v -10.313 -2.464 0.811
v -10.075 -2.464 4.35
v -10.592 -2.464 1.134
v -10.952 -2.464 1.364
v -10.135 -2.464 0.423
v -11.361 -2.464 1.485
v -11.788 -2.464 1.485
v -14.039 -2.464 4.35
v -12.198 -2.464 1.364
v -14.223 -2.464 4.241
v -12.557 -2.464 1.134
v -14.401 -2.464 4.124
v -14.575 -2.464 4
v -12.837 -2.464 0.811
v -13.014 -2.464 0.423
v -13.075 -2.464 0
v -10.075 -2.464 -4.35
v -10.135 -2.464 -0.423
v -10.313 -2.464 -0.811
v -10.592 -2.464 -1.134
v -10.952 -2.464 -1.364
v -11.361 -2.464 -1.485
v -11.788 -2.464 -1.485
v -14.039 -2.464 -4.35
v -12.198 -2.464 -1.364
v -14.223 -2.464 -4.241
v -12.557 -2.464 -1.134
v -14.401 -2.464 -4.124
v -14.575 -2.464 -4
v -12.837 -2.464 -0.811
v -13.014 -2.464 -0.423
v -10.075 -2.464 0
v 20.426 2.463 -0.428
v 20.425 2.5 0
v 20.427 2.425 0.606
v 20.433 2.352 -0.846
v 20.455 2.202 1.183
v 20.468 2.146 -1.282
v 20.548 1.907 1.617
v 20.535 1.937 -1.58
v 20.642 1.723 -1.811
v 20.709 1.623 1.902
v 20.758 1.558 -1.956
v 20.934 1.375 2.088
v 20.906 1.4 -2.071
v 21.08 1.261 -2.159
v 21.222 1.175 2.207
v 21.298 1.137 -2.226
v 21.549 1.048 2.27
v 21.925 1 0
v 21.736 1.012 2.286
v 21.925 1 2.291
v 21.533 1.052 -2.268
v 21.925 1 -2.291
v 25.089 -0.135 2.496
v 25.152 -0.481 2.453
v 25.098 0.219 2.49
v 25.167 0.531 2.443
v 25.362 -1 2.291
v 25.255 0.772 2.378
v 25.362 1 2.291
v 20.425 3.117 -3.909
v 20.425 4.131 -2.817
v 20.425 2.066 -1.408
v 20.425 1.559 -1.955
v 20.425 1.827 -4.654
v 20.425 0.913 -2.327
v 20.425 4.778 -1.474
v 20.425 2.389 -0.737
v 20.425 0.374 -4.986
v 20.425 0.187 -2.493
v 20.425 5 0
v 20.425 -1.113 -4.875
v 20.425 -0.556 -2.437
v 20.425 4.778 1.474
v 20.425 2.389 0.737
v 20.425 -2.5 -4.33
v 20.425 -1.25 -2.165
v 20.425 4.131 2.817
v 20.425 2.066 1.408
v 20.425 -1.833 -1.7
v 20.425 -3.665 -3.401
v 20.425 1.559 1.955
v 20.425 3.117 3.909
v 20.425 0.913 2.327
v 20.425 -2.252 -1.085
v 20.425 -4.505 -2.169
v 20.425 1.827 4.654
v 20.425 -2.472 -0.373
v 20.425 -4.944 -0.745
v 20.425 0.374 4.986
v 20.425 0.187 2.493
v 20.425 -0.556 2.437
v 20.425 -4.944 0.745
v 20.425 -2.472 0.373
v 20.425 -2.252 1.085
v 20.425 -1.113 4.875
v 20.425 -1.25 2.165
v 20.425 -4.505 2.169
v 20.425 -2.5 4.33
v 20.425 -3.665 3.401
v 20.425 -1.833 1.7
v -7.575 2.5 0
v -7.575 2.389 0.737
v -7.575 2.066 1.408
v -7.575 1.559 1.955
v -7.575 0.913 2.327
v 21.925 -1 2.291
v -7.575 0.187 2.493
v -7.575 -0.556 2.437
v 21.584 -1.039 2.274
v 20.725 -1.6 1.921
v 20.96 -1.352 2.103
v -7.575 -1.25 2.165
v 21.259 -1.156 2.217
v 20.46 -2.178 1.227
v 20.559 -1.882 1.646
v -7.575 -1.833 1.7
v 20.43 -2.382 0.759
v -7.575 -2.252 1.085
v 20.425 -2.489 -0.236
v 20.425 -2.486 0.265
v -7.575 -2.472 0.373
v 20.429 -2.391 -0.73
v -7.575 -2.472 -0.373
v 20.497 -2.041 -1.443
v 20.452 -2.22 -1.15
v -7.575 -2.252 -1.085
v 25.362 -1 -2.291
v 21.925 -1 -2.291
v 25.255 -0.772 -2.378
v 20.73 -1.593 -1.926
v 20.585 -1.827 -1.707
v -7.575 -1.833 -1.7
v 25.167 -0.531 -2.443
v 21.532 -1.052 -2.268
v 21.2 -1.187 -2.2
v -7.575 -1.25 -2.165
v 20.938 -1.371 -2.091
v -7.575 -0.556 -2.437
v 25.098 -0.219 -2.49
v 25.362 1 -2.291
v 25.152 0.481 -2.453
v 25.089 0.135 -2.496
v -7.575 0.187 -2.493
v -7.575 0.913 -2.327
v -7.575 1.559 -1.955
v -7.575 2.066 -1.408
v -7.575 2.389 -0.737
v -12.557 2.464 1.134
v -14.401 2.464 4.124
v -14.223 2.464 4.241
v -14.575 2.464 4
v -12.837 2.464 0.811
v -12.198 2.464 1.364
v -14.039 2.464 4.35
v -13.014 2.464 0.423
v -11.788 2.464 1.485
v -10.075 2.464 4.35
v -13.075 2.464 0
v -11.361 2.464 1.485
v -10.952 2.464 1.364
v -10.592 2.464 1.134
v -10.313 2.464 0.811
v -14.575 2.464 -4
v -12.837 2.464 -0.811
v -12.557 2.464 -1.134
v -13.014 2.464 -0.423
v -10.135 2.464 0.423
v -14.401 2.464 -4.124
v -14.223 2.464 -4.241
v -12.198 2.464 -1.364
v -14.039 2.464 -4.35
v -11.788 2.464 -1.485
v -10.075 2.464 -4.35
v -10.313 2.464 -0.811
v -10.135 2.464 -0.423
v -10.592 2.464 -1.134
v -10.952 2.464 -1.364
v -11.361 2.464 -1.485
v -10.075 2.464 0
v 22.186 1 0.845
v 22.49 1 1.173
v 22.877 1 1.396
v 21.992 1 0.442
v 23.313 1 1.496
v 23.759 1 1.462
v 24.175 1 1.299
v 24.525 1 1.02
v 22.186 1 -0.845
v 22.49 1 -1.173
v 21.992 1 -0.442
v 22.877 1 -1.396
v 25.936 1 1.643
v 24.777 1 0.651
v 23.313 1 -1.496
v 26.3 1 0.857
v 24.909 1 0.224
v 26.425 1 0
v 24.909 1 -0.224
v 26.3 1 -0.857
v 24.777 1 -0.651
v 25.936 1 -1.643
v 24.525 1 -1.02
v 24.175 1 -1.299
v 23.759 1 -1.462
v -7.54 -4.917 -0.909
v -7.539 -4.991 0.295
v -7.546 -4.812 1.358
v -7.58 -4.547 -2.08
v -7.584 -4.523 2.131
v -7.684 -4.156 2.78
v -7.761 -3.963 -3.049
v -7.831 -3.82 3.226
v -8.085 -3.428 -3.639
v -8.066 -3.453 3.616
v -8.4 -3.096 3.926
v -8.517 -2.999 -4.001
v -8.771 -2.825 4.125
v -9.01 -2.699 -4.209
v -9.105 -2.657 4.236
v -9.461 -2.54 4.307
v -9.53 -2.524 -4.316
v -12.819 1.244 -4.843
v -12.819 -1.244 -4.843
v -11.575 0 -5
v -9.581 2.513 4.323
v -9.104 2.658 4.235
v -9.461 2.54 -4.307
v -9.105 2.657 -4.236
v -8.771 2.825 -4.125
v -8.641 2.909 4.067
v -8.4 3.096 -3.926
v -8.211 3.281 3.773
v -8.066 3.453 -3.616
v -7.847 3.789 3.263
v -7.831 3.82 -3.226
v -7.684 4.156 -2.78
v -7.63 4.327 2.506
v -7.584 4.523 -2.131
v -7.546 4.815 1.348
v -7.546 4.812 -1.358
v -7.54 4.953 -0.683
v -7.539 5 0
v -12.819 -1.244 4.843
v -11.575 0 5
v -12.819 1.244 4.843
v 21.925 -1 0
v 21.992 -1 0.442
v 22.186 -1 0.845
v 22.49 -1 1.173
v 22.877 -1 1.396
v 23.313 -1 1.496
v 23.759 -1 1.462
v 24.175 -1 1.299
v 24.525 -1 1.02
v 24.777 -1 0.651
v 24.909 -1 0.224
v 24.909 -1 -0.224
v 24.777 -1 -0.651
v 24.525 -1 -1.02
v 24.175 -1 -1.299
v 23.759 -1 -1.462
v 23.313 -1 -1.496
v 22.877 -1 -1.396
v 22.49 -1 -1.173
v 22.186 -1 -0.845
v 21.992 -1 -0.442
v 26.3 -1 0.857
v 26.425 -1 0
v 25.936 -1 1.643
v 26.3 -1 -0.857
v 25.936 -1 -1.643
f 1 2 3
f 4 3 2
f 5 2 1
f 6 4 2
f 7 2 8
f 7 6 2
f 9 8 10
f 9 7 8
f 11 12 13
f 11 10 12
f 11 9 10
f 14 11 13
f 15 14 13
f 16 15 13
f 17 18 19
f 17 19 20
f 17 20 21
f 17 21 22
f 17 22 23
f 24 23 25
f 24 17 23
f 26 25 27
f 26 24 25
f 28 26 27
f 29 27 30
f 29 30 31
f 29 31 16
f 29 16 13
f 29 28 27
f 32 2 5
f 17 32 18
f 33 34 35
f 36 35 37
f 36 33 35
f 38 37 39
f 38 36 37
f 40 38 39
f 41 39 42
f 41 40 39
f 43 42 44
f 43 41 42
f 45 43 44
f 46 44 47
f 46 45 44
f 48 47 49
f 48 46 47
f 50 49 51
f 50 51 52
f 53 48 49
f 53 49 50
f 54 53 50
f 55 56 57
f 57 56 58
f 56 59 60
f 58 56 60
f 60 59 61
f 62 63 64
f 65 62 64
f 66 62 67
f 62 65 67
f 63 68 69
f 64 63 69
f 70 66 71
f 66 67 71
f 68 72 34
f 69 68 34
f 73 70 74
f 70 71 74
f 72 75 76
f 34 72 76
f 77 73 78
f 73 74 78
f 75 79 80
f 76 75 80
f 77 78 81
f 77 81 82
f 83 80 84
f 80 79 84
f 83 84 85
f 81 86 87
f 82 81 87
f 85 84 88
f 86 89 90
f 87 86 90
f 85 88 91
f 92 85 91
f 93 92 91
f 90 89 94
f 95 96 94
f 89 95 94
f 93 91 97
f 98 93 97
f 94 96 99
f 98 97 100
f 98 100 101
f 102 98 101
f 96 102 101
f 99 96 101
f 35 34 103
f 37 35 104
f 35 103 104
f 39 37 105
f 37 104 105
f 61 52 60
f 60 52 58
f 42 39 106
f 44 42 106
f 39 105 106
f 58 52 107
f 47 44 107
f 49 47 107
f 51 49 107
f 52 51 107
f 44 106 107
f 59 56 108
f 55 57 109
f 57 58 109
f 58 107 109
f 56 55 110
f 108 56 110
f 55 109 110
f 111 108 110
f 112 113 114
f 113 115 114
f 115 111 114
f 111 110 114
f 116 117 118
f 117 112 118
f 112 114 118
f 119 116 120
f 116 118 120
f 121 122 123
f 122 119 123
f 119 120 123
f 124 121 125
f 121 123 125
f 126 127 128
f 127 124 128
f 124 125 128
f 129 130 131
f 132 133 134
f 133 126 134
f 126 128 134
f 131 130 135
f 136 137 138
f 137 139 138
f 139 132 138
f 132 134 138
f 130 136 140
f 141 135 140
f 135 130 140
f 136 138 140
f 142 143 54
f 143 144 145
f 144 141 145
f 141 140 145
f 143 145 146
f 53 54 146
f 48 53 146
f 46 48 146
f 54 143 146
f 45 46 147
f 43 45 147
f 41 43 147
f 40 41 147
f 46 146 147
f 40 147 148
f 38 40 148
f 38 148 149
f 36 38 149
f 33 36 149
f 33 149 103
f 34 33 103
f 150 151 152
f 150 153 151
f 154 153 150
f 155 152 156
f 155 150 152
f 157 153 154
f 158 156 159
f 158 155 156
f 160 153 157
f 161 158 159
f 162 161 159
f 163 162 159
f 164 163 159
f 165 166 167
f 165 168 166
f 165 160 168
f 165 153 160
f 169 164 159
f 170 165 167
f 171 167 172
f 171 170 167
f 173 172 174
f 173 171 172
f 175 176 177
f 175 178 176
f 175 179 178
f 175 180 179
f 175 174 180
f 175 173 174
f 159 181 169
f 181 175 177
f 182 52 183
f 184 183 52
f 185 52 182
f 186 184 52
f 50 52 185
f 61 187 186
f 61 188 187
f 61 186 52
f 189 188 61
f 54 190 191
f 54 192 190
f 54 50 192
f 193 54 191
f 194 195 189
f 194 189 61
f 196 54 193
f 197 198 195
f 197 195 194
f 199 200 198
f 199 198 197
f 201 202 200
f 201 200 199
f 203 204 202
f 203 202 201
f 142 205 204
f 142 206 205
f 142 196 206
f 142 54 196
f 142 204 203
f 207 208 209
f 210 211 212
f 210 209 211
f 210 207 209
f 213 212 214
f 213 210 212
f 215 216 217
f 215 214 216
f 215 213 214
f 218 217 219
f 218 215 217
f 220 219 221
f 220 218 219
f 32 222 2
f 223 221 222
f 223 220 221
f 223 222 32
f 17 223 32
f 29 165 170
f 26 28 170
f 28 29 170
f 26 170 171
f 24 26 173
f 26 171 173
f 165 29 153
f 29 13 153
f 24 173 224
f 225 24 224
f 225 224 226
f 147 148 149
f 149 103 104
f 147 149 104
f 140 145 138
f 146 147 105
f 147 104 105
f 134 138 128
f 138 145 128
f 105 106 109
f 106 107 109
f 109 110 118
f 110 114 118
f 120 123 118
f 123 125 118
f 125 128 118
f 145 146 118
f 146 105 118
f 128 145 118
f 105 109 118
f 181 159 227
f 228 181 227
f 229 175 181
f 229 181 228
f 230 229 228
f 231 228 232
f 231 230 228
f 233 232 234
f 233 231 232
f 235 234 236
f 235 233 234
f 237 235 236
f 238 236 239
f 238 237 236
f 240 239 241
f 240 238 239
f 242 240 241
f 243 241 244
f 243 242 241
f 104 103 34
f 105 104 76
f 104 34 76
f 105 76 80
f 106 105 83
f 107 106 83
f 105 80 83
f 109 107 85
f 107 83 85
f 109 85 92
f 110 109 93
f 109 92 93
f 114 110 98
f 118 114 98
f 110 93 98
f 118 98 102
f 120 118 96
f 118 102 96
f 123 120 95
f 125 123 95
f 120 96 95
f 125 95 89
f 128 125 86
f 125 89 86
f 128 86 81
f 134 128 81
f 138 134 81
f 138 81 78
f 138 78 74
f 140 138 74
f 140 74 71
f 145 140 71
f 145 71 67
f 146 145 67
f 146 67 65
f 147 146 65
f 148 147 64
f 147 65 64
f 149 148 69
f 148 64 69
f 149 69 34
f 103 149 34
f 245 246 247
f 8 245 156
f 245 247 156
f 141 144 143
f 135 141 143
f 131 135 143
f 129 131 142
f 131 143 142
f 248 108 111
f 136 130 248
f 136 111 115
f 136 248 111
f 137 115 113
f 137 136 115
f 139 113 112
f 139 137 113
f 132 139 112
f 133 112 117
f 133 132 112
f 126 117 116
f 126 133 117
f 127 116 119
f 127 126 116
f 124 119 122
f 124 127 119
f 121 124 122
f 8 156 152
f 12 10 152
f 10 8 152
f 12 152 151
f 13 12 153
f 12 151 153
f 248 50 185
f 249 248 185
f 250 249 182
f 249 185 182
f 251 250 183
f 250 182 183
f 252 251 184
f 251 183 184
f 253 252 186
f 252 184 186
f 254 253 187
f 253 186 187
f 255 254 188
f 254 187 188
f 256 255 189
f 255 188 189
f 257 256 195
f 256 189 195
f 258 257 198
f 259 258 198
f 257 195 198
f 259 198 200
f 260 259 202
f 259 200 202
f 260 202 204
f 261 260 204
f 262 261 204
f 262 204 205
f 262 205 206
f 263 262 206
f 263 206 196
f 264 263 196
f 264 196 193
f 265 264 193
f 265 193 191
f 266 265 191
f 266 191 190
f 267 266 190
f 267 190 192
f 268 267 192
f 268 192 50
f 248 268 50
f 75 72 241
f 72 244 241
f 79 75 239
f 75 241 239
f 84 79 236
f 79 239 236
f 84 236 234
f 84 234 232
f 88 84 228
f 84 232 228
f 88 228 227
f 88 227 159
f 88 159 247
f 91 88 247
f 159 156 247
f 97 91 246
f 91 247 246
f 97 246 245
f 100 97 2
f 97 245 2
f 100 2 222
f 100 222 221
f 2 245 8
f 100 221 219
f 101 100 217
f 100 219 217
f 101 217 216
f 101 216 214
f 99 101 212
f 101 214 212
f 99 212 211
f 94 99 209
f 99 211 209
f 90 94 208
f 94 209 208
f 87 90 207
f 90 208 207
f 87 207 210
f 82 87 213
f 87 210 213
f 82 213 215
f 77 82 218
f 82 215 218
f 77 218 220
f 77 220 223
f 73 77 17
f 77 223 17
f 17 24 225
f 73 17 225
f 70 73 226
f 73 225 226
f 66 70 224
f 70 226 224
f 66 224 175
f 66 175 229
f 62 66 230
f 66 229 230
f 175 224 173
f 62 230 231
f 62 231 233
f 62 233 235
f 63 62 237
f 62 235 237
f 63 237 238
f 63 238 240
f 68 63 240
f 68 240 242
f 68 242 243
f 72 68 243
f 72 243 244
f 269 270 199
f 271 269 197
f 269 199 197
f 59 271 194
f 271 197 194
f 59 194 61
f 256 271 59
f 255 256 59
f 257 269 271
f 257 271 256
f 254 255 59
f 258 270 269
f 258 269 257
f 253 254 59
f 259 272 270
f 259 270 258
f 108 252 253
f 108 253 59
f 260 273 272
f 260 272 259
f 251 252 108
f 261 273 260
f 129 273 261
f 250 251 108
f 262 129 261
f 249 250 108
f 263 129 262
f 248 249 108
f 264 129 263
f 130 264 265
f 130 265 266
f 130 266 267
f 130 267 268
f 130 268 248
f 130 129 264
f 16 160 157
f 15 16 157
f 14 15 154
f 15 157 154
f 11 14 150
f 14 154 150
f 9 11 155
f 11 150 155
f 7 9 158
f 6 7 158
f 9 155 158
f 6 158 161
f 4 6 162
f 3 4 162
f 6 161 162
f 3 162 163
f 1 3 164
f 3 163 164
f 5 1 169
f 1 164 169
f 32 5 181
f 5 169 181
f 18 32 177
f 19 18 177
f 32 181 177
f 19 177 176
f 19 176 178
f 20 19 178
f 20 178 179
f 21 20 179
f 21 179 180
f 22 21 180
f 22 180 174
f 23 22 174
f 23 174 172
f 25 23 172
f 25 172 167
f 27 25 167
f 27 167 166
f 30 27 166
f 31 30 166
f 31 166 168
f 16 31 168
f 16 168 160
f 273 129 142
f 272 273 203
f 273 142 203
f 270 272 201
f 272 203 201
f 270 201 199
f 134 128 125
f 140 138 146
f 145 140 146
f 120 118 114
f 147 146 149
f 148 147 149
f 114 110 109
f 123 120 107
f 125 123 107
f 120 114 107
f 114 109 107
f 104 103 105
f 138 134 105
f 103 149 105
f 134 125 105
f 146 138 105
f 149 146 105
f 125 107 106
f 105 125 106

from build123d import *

# Parameters (mm, degrees)
F4_DEPTH      = 5.001
F4_DEPTH_BACK = 5.001
F5_R          = 1.5
F6_DEPTH      = 6.0010001
F8_DEPTH      = 7.4654661941


with BuildPart() as f1:
    # F0 (on Top) → F1 (revolve)
    with BuildSketch(Plane.XY):
        Polygon((20.4253451601, 2.5), (-7.5746548399, 2.5), (-7.5746548399, 0), (26.4253451601, 0), (26.4253451601, 2.5), align=None)
    revolve(axis=Axis((-0.3558665388, 0, 0), (1, 0, 0)))


with BuildPart() as f2:
    # F0 (on Top) → F2 (revolve)
    with BuildSketch(Plane.XY):
        Polygon((-7.5746548399, 0), (-7.5746548399, 2.5), (20.4253451601, 2.5), (20.4253451601, 5), (-14.5746548399, 5), (-14.5746548399, 0), align=None)
    revolve(axis=Axis((-0.3558665388, 0, 0), (1, 0, 0)))


with BuildPart() as f4_tool:
    # F3 (on Top) → F4 (new body, two sides)
    with BuildSketch(Plane.XY) as f4_sk:
        with BuildLine():
            Line((-10.0746548399, -2.4644660941), (-14.5746548399, -2.4644660941))
            Line((-14.5746548399, -2.4644660941), (-14.5746548399, -5))
            Line((-14.5746548399, -5), (-7.539120934, -5))
            ThreePointArc((-7.539120934, -5), (-8.2817616211, -3.2071067812), (-10.0746548399, -2.4644660941))
        make_face()
        with BuildLine():
            Line((-7.539120934, 5), (-14.5746548399, 5))
            Line((-14.5746548399, 5), (-14.5746548399, 2.4644660941))
            Line((-14.5746548399, 2.4644660941), (-10.0746548399, 2.4644660941))
            ThreePointArc((-10.0746548399, 2.4644660941), (-8.2817616211, 3.2071067812), (-7.539120934, 5))
        make_face()
        with BuildLine():
            Line((26.4253451601, -2.5), (26.4253451601, -1))
            Line((26.4253451601, -1), (21.9253451601, -1))
            ThreePointArc((21.9253451601, -1), (20.8646849883, -1.4393398282), (20.4253451601, -2.5))
            Line((20.4253451601, -2.5), (26.4253451601, -2.5))
        make_face()
        with BuildLine():
            Line((21.9253451601, 1), (26.4253451601, 1))
            Line((26.4253451601, 1), (26.4253451601, 2.5))
            Line((26.4253451601, 2.5), (20.4253451601, 2.5))
            ThreePointArc((20.4253451601, 2.5), (20.8646849883, 1.4393398282), (21.9253451601, 1))
        make_face()
    extrude(amount=-F4_DEPTH)
    extrude(f4_sk.sketch, amount=F4_DEPTH_BACK)


with BuildPart() as f1_1:
    add(f1.part)

    # F4: cut by f4_tool
    add(f4_tool.part, mode=Mode.SUBTRACT)

    # F5 (on face) → F6 (cut, through all)
    with BuildSketch(Plane(origin=(0, 1, 0), x_dir=(-1, 0, 0), z_dir=(0, 1, 0))):
        with BuildLine():
            ThreePointArc((-26.4253451601, 0), (-26.1465098941, 1.2630370107), (-25.3618368332, 2.2912878475))
            Line((-25.3618368332, 2.2912878475), (-26.4253451601, 2.2912878475))
            Line((-26.4253451601, 2.2912878475), (-26.4253451601, 0))
        make_face()
        with BuildLine():
            Line((-26.4253451601, 2.2912878475), (-25.3618368332, 2.2912878475))
            ThreePointArc((-25.3618368332, 2.2912878475), (-25.2257740709, 2.399678257), (-25.0836575552, 2.5))
            Line((-25.0836575552, 2.5), (-26.4253451601, 2.5))
            Line((-26.4253451601, 2.5), (-26.4253451601, 2.2912878475))
        make_face()
        with BuildLine():
            Line((-26.4253451601, -2.2912878475), (-25.3618368332, -2.2912878475))
            ThreePointArc((-25.3618368332, -2.2912878475), (-26.1465098941, -1.2630370107), (-26.4253451601, 0))
            Line((-26.4253451601, 0), (-26.4253451601, -2.2912878475))
        make_face()
        with BuildLine():
            ThreePointArc((-25.0836575552, -2.5), (-25.2257740709, -2.399678257), (-25.3618368332, -2.2912878475))
            Line((-25.3618368332, -2.2912878475), (-26.4253451601, -2.2912878475))
            Line((-26.4253451601, -2.2912878475), (-26.4253451601, -2.5))
            Line((-26.4253451601, -2.5), (-25.0836575552, -2.5))
        make_face()
        with Locations((-23.4253451601, 0)):
            Circle(F5_R)
    extrude(amount=-F6_DEPTH, mode=Mode.SUBTRACT)


with BuildPart() as f2_1:
    add(f2.part)

    # F4: cut by f4_tool
    add(f4_tool.part, mode=Mode.SUBTRACT)

    # F7 (on face) → F8 (cut, through all)
    with BuildSketch(Plane(origin=(0, 2.4644660941, 0), x_dir=(-1, 0, 0), z_dir=(0, 1, 0))):
        with BuildLine():
            ThreePointArc((14.5746548399, -4), (14.3125009014, -4.1838019724), (14.039120934, -4.3504490425))
            Line((14.039120934, -4.3504490425), (14.5746548399, -4.3504490425))
            Line((14.5746548399, -4.3504490425), (14.5746548399, -4))
        make_face()
        with BuildLine():
            Line((14.5746548399, -4.3504490425), (14.039120934, -4.3504490425))
            ThreePointArc((14.039120934, -4.3504490425), (12.8489693199, -4.8348859972), (11.5746548399, -5))
            Line((11.5746548399, -5), (14.5746548399, -5))
            Line((14.5746548399, -5), (14.5746548399, -4.3504490425))
        make_face()
        with BuildLine():
            Line((14.5746548399, 4.3504490425), (14.039120934, 4.3504490425))
            ThreePointArc((14.039120934, 4.3504490425), (14.3125009014, 4.1838019724), (14.5746548399, 4))
            Line((14.5746548399, 4), (14.5746548399, 4.3504490425))
        make_face()
        with BuildLine():
            ThreePointArc((11.5746548399, 5), (12.8489693199, 4.8348859972), (14.039120934, 4.3504490425))
            Line((14.039120934, 4.3504490425), (14.5746548399, 4.3504490425))
            Line((14.5746548399, 4.3504490425), (14.5746548399, 5))
            Line((14.5746548399, 5), (11.5746548399, 5))
        make_face()
        with BuildLine():
            ThreePointArc((10.0746548399, 0), (11.5746548399, -1.5), (13.0746548399, 0))
            ThreePointArc((13.0746548399, 0), (11.5746548399, 1.5), (10.0746548399, 0))
        make_face()
    extrude(amount=-F8_DEPTH, mode=Mode.SUBTRACT)


solid = Compound([f1_1.part, f2_1.part])
